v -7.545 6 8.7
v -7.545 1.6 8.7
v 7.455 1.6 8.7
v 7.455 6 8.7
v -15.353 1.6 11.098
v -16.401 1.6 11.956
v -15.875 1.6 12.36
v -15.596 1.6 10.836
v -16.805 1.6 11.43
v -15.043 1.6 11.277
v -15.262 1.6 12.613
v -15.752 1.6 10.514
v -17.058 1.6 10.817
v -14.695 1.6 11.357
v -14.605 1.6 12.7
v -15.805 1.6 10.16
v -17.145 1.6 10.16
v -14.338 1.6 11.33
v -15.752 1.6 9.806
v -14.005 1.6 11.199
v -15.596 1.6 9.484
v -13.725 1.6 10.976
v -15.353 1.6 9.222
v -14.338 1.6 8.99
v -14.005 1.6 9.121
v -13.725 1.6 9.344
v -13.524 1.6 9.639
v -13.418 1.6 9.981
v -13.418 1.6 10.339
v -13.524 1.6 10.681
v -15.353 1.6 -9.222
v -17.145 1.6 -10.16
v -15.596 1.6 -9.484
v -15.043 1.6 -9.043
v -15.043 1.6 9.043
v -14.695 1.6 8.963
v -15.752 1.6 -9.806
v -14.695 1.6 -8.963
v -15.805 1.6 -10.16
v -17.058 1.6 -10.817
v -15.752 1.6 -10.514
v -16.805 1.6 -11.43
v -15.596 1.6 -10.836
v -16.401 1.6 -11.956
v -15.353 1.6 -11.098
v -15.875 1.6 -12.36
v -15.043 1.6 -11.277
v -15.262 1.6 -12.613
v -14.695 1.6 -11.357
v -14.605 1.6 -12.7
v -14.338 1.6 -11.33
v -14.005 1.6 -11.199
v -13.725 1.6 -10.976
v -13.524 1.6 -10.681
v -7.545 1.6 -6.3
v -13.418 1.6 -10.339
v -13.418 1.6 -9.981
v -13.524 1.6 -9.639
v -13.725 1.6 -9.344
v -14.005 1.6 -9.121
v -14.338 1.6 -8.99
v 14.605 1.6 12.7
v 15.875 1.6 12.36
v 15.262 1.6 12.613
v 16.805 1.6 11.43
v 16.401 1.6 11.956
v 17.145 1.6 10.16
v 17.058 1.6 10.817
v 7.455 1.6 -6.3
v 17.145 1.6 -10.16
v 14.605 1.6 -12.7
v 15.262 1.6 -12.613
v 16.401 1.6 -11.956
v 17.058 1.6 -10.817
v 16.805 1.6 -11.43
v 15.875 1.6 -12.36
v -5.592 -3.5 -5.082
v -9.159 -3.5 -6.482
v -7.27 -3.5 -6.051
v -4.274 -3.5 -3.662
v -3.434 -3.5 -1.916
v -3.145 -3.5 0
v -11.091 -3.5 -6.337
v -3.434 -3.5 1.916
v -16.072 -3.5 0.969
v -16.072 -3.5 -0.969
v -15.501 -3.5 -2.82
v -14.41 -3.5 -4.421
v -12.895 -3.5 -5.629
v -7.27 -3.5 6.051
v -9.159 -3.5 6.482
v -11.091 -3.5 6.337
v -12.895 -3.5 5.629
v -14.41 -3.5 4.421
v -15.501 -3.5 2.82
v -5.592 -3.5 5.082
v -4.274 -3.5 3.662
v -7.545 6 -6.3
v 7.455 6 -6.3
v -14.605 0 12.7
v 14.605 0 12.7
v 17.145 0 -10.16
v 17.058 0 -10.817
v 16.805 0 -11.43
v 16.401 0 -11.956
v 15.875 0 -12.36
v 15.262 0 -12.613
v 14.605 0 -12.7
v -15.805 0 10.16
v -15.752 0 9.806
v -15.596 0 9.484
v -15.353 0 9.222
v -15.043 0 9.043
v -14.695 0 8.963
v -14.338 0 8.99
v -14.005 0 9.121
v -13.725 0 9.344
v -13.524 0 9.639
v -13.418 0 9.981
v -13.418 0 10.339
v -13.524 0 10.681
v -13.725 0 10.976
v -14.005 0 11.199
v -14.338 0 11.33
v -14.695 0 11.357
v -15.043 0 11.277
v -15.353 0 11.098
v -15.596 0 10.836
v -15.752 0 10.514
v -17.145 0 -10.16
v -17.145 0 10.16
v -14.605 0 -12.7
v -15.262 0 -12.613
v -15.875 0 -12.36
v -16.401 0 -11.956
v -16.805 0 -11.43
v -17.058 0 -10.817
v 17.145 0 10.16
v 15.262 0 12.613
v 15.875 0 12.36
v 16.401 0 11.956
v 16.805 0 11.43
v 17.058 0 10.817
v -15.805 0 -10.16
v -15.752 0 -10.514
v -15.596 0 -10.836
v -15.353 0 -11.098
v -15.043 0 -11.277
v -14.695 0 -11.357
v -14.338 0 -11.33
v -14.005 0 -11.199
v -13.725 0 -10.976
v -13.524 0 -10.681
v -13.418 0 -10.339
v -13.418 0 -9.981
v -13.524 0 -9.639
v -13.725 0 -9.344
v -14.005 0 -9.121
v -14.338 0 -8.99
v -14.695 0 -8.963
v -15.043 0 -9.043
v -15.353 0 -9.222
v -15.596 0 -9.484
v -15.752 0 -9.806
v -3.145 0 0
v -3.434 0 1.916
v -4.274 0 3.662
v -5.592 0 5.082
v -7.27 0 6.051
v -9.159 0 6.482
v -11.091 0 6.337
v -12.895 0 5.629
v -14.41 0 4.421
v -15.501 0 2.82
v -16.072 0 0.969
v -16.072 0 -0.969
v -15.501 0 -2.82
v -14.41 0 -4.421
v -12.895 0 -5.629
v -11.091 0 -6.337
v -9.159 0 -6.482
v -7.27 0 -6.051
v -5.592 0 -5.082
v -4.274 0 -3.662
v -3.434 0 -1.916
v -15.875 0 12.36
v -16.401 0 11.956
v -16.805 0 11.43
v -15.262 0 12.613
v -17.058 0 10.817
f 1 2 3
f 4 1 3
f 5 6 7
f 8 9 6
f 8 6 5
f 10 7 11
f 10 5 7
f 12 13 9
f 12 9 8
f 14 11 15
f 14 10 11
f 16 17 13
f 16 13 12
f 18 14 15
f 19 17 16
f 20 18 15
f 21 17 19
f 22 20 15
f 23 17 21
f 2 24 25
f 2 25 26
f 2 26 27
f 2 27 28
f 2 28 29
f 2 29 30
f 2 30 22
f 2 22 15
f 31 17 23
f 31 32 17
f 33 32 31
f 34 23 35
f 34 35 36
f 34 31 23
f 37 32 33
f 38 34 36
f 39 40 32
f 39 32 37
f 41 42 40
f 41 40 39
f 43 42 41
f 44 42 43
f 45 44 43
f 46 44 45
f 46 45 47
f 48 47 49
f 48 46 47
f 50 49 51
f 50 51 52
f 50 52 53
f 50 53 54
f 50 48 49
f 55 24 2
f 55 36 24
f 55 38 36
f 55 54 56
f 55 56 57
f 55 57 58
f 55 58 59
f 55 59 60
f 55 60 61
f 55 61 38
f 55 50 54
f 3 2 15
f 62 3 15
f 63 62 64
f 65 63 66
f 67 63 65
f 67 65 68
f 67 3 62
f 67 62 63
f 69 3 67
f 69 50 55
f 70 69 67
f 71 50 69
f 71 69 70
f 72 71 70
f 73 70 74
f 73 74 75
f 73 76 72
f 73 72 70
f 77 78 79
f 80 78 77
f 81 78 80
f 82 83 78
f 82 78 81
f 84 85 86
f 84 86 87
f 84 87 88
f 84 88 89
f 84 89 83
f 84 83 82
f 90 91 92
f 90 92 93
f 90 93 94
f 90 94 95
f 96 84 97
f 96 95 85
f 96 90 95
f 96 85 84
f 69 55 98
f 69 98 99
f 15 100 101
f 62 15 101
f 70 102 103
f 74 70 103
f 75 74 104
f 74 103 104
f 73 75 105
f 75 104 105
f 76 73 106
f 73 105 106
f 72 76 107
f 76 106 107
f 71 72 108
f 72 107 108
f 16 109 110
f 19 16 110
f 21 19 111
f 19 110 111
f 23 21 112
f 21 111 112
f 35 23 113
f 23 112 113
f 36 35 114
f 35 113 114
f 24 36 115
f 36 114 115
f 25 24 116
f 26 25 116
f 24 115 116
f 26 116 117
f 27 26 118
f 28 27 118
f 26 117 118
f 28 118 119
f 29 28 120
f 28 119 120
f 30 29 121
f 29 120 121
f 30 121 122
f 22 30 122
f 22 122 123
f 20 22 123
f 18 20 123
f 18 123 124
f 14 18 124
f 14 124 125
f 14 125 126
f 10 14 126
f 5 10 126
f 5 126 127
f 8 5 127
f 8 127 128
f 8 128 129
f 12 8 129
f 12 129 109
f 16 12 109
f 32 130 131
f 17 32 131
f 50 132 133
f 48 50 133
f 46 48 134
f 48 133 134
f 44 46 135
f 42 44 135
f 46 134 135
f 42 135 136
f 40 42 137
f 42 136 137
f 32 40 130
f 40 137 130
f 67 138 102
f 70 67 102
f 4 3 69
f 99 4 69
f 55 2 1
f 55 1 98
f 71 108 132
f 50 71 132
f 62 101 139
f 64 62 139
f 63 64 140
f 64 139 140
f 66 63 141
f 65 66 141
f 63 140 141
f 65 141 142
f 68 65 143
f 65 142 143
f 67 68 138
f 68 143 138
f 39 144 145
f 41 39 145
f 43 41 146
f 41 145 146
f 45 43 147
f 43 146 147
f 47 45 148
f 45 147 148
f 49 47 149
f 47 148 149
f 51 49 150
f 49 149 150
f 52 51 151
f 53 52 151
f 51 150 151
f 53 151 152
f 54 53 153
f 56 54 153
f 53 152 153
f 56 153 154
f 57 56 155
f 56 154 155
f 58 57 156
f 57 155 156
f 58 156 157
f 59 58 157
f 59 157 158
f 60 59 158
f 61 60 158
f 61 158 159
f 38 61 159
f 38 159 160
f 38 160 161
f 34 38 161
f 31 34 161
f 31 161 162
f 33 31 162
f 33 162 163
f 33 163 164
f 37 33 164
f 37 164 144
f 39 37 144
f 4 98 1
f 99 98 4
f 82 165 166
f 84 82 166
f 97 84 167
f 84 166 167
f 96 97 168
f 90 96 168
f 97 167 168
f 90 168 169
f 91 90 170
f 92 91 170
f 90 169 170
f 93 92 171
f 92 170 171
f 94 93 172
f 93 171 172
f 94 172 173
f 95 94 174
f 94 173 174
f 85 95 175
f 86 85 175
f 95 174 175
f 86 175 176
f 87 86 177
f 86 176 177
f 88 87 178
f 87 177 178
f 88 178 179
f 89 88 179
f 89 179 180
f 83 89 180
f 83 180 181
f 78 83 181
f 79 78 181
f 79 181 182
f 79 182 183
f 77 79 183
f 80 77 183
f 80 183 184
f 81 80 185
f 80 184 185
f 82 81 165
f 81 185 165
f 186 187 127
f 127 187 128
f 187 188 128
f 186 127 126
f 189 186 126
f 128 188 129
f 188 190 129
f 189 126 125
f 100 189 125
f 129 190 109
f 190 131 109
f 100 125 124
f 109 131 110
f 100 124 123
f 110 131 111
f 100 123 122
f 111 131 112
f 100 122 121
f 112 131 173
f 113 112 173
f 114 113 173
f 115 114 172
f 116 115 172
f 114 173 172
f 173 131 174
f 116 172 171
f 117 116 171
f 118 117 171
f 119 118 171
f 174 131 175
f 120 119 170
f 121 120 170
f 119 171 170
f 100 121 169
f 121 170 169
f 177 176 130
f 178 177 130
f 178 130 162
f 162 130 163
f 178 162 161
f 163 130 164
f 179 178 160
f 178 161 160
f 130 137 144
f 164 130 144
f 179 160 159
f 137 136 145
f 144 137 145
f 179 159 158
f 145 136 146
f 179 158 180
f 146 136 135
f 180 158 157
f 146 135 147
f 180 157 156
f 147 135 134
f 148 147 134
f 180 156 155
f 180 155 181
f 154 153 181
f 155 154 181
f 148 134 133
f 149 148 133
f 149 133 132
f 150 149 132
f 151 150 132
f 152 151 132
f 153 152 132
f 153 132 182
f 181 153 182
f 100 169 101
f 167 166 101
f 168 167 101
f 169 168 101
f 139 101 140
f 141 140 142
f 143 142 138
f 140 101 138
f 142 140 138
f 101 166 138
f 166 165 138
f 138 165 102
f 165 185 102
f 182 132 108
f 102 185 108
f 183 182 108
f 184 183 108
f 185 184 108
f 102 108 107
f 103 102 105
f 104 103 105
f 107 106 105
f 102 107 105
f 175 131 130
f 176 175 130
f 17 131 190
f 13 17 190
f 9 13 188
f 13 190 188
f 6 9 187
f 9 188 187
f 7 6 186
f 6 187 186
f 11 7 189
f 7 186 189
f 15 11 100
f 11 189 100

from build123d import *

# Parameters (mm, degrees)
PCB_DEPTH            = 1.6
M2_CLEARANCE_HOLE1_D = 2.4
SKETCH4_W            = 15
SKETCH4_H            = 15
ANTENNA_DEPTH        = 4.4
SKETCH5_R            = 6.5
BATTERY_HOLDER_DEPTH = 3.5


with BuildPart() as part:
    # Sketch1 → PCB (new body)
    with BuildSketch(Plane(origin=(0, 0, 0), x_dir=(1, 0, 0), z_dir=(0, 1, 0))):
        with BuildLine():
            Line((-14.605, -12.7), (14.605, -12.7))
            ThreePointArc((14.605, -12.7), (16.401051224, -11.956051224), (17.145, -10.16))
            Line((17.145, -10.16), (17.145, 10.16))
            ThreePointArc((17.145, 10.16), (16.401051224, 11.956051224), (14.605, 12.7))
            Line((14.605, 12.7), (-14.605, 12.7))
            ThreePointArc((-14.605, 12.7), (-16.401051224, 11.956051224), (-17.145, 10.16))
            Line((-17.145, 10.16), (-17.145, -10.16))
            ThreePointArc((-17.145, -10.16), (-16.401051224, -11.956051224), (-14.605, -12.7))
        make_face()
    extrude(amount=PCB_DEPTH)

    # M2 Clearance Hole1 (through all)
    with Locations(Plane(origin=(0, 1.6, 0), x_dir=(1, 0, 0), z_dir=(0, 1, 0))):
        with Locations((-14.605, -10.16), (-14.605, 10.16)):
            Hole(M2_CLEARANCE_HOLE1_D / 2)

    # Sketch4 → Antenna (add)
    with BuildSketch(Plane(origin=(0, 1.6, 0), x_dir=(1, 0, 0), z_dir=(0, 1, 0))):
        with Locations((-0.045, -1.2)):
            Rectangle(SKETCH4_W, SKETCH4_H)
    extrude(amount=ANTENNA_DEPTH)

    # Sketch5 → Battery Holder (add)
    with BuildSketch(Plane.XZ):
        with Locations((-9.645, 0)):
            Circle(SKETCH5_R)
    extrude(amount=BATTERY_HOLDER_DEPTH)


solid = part.part
